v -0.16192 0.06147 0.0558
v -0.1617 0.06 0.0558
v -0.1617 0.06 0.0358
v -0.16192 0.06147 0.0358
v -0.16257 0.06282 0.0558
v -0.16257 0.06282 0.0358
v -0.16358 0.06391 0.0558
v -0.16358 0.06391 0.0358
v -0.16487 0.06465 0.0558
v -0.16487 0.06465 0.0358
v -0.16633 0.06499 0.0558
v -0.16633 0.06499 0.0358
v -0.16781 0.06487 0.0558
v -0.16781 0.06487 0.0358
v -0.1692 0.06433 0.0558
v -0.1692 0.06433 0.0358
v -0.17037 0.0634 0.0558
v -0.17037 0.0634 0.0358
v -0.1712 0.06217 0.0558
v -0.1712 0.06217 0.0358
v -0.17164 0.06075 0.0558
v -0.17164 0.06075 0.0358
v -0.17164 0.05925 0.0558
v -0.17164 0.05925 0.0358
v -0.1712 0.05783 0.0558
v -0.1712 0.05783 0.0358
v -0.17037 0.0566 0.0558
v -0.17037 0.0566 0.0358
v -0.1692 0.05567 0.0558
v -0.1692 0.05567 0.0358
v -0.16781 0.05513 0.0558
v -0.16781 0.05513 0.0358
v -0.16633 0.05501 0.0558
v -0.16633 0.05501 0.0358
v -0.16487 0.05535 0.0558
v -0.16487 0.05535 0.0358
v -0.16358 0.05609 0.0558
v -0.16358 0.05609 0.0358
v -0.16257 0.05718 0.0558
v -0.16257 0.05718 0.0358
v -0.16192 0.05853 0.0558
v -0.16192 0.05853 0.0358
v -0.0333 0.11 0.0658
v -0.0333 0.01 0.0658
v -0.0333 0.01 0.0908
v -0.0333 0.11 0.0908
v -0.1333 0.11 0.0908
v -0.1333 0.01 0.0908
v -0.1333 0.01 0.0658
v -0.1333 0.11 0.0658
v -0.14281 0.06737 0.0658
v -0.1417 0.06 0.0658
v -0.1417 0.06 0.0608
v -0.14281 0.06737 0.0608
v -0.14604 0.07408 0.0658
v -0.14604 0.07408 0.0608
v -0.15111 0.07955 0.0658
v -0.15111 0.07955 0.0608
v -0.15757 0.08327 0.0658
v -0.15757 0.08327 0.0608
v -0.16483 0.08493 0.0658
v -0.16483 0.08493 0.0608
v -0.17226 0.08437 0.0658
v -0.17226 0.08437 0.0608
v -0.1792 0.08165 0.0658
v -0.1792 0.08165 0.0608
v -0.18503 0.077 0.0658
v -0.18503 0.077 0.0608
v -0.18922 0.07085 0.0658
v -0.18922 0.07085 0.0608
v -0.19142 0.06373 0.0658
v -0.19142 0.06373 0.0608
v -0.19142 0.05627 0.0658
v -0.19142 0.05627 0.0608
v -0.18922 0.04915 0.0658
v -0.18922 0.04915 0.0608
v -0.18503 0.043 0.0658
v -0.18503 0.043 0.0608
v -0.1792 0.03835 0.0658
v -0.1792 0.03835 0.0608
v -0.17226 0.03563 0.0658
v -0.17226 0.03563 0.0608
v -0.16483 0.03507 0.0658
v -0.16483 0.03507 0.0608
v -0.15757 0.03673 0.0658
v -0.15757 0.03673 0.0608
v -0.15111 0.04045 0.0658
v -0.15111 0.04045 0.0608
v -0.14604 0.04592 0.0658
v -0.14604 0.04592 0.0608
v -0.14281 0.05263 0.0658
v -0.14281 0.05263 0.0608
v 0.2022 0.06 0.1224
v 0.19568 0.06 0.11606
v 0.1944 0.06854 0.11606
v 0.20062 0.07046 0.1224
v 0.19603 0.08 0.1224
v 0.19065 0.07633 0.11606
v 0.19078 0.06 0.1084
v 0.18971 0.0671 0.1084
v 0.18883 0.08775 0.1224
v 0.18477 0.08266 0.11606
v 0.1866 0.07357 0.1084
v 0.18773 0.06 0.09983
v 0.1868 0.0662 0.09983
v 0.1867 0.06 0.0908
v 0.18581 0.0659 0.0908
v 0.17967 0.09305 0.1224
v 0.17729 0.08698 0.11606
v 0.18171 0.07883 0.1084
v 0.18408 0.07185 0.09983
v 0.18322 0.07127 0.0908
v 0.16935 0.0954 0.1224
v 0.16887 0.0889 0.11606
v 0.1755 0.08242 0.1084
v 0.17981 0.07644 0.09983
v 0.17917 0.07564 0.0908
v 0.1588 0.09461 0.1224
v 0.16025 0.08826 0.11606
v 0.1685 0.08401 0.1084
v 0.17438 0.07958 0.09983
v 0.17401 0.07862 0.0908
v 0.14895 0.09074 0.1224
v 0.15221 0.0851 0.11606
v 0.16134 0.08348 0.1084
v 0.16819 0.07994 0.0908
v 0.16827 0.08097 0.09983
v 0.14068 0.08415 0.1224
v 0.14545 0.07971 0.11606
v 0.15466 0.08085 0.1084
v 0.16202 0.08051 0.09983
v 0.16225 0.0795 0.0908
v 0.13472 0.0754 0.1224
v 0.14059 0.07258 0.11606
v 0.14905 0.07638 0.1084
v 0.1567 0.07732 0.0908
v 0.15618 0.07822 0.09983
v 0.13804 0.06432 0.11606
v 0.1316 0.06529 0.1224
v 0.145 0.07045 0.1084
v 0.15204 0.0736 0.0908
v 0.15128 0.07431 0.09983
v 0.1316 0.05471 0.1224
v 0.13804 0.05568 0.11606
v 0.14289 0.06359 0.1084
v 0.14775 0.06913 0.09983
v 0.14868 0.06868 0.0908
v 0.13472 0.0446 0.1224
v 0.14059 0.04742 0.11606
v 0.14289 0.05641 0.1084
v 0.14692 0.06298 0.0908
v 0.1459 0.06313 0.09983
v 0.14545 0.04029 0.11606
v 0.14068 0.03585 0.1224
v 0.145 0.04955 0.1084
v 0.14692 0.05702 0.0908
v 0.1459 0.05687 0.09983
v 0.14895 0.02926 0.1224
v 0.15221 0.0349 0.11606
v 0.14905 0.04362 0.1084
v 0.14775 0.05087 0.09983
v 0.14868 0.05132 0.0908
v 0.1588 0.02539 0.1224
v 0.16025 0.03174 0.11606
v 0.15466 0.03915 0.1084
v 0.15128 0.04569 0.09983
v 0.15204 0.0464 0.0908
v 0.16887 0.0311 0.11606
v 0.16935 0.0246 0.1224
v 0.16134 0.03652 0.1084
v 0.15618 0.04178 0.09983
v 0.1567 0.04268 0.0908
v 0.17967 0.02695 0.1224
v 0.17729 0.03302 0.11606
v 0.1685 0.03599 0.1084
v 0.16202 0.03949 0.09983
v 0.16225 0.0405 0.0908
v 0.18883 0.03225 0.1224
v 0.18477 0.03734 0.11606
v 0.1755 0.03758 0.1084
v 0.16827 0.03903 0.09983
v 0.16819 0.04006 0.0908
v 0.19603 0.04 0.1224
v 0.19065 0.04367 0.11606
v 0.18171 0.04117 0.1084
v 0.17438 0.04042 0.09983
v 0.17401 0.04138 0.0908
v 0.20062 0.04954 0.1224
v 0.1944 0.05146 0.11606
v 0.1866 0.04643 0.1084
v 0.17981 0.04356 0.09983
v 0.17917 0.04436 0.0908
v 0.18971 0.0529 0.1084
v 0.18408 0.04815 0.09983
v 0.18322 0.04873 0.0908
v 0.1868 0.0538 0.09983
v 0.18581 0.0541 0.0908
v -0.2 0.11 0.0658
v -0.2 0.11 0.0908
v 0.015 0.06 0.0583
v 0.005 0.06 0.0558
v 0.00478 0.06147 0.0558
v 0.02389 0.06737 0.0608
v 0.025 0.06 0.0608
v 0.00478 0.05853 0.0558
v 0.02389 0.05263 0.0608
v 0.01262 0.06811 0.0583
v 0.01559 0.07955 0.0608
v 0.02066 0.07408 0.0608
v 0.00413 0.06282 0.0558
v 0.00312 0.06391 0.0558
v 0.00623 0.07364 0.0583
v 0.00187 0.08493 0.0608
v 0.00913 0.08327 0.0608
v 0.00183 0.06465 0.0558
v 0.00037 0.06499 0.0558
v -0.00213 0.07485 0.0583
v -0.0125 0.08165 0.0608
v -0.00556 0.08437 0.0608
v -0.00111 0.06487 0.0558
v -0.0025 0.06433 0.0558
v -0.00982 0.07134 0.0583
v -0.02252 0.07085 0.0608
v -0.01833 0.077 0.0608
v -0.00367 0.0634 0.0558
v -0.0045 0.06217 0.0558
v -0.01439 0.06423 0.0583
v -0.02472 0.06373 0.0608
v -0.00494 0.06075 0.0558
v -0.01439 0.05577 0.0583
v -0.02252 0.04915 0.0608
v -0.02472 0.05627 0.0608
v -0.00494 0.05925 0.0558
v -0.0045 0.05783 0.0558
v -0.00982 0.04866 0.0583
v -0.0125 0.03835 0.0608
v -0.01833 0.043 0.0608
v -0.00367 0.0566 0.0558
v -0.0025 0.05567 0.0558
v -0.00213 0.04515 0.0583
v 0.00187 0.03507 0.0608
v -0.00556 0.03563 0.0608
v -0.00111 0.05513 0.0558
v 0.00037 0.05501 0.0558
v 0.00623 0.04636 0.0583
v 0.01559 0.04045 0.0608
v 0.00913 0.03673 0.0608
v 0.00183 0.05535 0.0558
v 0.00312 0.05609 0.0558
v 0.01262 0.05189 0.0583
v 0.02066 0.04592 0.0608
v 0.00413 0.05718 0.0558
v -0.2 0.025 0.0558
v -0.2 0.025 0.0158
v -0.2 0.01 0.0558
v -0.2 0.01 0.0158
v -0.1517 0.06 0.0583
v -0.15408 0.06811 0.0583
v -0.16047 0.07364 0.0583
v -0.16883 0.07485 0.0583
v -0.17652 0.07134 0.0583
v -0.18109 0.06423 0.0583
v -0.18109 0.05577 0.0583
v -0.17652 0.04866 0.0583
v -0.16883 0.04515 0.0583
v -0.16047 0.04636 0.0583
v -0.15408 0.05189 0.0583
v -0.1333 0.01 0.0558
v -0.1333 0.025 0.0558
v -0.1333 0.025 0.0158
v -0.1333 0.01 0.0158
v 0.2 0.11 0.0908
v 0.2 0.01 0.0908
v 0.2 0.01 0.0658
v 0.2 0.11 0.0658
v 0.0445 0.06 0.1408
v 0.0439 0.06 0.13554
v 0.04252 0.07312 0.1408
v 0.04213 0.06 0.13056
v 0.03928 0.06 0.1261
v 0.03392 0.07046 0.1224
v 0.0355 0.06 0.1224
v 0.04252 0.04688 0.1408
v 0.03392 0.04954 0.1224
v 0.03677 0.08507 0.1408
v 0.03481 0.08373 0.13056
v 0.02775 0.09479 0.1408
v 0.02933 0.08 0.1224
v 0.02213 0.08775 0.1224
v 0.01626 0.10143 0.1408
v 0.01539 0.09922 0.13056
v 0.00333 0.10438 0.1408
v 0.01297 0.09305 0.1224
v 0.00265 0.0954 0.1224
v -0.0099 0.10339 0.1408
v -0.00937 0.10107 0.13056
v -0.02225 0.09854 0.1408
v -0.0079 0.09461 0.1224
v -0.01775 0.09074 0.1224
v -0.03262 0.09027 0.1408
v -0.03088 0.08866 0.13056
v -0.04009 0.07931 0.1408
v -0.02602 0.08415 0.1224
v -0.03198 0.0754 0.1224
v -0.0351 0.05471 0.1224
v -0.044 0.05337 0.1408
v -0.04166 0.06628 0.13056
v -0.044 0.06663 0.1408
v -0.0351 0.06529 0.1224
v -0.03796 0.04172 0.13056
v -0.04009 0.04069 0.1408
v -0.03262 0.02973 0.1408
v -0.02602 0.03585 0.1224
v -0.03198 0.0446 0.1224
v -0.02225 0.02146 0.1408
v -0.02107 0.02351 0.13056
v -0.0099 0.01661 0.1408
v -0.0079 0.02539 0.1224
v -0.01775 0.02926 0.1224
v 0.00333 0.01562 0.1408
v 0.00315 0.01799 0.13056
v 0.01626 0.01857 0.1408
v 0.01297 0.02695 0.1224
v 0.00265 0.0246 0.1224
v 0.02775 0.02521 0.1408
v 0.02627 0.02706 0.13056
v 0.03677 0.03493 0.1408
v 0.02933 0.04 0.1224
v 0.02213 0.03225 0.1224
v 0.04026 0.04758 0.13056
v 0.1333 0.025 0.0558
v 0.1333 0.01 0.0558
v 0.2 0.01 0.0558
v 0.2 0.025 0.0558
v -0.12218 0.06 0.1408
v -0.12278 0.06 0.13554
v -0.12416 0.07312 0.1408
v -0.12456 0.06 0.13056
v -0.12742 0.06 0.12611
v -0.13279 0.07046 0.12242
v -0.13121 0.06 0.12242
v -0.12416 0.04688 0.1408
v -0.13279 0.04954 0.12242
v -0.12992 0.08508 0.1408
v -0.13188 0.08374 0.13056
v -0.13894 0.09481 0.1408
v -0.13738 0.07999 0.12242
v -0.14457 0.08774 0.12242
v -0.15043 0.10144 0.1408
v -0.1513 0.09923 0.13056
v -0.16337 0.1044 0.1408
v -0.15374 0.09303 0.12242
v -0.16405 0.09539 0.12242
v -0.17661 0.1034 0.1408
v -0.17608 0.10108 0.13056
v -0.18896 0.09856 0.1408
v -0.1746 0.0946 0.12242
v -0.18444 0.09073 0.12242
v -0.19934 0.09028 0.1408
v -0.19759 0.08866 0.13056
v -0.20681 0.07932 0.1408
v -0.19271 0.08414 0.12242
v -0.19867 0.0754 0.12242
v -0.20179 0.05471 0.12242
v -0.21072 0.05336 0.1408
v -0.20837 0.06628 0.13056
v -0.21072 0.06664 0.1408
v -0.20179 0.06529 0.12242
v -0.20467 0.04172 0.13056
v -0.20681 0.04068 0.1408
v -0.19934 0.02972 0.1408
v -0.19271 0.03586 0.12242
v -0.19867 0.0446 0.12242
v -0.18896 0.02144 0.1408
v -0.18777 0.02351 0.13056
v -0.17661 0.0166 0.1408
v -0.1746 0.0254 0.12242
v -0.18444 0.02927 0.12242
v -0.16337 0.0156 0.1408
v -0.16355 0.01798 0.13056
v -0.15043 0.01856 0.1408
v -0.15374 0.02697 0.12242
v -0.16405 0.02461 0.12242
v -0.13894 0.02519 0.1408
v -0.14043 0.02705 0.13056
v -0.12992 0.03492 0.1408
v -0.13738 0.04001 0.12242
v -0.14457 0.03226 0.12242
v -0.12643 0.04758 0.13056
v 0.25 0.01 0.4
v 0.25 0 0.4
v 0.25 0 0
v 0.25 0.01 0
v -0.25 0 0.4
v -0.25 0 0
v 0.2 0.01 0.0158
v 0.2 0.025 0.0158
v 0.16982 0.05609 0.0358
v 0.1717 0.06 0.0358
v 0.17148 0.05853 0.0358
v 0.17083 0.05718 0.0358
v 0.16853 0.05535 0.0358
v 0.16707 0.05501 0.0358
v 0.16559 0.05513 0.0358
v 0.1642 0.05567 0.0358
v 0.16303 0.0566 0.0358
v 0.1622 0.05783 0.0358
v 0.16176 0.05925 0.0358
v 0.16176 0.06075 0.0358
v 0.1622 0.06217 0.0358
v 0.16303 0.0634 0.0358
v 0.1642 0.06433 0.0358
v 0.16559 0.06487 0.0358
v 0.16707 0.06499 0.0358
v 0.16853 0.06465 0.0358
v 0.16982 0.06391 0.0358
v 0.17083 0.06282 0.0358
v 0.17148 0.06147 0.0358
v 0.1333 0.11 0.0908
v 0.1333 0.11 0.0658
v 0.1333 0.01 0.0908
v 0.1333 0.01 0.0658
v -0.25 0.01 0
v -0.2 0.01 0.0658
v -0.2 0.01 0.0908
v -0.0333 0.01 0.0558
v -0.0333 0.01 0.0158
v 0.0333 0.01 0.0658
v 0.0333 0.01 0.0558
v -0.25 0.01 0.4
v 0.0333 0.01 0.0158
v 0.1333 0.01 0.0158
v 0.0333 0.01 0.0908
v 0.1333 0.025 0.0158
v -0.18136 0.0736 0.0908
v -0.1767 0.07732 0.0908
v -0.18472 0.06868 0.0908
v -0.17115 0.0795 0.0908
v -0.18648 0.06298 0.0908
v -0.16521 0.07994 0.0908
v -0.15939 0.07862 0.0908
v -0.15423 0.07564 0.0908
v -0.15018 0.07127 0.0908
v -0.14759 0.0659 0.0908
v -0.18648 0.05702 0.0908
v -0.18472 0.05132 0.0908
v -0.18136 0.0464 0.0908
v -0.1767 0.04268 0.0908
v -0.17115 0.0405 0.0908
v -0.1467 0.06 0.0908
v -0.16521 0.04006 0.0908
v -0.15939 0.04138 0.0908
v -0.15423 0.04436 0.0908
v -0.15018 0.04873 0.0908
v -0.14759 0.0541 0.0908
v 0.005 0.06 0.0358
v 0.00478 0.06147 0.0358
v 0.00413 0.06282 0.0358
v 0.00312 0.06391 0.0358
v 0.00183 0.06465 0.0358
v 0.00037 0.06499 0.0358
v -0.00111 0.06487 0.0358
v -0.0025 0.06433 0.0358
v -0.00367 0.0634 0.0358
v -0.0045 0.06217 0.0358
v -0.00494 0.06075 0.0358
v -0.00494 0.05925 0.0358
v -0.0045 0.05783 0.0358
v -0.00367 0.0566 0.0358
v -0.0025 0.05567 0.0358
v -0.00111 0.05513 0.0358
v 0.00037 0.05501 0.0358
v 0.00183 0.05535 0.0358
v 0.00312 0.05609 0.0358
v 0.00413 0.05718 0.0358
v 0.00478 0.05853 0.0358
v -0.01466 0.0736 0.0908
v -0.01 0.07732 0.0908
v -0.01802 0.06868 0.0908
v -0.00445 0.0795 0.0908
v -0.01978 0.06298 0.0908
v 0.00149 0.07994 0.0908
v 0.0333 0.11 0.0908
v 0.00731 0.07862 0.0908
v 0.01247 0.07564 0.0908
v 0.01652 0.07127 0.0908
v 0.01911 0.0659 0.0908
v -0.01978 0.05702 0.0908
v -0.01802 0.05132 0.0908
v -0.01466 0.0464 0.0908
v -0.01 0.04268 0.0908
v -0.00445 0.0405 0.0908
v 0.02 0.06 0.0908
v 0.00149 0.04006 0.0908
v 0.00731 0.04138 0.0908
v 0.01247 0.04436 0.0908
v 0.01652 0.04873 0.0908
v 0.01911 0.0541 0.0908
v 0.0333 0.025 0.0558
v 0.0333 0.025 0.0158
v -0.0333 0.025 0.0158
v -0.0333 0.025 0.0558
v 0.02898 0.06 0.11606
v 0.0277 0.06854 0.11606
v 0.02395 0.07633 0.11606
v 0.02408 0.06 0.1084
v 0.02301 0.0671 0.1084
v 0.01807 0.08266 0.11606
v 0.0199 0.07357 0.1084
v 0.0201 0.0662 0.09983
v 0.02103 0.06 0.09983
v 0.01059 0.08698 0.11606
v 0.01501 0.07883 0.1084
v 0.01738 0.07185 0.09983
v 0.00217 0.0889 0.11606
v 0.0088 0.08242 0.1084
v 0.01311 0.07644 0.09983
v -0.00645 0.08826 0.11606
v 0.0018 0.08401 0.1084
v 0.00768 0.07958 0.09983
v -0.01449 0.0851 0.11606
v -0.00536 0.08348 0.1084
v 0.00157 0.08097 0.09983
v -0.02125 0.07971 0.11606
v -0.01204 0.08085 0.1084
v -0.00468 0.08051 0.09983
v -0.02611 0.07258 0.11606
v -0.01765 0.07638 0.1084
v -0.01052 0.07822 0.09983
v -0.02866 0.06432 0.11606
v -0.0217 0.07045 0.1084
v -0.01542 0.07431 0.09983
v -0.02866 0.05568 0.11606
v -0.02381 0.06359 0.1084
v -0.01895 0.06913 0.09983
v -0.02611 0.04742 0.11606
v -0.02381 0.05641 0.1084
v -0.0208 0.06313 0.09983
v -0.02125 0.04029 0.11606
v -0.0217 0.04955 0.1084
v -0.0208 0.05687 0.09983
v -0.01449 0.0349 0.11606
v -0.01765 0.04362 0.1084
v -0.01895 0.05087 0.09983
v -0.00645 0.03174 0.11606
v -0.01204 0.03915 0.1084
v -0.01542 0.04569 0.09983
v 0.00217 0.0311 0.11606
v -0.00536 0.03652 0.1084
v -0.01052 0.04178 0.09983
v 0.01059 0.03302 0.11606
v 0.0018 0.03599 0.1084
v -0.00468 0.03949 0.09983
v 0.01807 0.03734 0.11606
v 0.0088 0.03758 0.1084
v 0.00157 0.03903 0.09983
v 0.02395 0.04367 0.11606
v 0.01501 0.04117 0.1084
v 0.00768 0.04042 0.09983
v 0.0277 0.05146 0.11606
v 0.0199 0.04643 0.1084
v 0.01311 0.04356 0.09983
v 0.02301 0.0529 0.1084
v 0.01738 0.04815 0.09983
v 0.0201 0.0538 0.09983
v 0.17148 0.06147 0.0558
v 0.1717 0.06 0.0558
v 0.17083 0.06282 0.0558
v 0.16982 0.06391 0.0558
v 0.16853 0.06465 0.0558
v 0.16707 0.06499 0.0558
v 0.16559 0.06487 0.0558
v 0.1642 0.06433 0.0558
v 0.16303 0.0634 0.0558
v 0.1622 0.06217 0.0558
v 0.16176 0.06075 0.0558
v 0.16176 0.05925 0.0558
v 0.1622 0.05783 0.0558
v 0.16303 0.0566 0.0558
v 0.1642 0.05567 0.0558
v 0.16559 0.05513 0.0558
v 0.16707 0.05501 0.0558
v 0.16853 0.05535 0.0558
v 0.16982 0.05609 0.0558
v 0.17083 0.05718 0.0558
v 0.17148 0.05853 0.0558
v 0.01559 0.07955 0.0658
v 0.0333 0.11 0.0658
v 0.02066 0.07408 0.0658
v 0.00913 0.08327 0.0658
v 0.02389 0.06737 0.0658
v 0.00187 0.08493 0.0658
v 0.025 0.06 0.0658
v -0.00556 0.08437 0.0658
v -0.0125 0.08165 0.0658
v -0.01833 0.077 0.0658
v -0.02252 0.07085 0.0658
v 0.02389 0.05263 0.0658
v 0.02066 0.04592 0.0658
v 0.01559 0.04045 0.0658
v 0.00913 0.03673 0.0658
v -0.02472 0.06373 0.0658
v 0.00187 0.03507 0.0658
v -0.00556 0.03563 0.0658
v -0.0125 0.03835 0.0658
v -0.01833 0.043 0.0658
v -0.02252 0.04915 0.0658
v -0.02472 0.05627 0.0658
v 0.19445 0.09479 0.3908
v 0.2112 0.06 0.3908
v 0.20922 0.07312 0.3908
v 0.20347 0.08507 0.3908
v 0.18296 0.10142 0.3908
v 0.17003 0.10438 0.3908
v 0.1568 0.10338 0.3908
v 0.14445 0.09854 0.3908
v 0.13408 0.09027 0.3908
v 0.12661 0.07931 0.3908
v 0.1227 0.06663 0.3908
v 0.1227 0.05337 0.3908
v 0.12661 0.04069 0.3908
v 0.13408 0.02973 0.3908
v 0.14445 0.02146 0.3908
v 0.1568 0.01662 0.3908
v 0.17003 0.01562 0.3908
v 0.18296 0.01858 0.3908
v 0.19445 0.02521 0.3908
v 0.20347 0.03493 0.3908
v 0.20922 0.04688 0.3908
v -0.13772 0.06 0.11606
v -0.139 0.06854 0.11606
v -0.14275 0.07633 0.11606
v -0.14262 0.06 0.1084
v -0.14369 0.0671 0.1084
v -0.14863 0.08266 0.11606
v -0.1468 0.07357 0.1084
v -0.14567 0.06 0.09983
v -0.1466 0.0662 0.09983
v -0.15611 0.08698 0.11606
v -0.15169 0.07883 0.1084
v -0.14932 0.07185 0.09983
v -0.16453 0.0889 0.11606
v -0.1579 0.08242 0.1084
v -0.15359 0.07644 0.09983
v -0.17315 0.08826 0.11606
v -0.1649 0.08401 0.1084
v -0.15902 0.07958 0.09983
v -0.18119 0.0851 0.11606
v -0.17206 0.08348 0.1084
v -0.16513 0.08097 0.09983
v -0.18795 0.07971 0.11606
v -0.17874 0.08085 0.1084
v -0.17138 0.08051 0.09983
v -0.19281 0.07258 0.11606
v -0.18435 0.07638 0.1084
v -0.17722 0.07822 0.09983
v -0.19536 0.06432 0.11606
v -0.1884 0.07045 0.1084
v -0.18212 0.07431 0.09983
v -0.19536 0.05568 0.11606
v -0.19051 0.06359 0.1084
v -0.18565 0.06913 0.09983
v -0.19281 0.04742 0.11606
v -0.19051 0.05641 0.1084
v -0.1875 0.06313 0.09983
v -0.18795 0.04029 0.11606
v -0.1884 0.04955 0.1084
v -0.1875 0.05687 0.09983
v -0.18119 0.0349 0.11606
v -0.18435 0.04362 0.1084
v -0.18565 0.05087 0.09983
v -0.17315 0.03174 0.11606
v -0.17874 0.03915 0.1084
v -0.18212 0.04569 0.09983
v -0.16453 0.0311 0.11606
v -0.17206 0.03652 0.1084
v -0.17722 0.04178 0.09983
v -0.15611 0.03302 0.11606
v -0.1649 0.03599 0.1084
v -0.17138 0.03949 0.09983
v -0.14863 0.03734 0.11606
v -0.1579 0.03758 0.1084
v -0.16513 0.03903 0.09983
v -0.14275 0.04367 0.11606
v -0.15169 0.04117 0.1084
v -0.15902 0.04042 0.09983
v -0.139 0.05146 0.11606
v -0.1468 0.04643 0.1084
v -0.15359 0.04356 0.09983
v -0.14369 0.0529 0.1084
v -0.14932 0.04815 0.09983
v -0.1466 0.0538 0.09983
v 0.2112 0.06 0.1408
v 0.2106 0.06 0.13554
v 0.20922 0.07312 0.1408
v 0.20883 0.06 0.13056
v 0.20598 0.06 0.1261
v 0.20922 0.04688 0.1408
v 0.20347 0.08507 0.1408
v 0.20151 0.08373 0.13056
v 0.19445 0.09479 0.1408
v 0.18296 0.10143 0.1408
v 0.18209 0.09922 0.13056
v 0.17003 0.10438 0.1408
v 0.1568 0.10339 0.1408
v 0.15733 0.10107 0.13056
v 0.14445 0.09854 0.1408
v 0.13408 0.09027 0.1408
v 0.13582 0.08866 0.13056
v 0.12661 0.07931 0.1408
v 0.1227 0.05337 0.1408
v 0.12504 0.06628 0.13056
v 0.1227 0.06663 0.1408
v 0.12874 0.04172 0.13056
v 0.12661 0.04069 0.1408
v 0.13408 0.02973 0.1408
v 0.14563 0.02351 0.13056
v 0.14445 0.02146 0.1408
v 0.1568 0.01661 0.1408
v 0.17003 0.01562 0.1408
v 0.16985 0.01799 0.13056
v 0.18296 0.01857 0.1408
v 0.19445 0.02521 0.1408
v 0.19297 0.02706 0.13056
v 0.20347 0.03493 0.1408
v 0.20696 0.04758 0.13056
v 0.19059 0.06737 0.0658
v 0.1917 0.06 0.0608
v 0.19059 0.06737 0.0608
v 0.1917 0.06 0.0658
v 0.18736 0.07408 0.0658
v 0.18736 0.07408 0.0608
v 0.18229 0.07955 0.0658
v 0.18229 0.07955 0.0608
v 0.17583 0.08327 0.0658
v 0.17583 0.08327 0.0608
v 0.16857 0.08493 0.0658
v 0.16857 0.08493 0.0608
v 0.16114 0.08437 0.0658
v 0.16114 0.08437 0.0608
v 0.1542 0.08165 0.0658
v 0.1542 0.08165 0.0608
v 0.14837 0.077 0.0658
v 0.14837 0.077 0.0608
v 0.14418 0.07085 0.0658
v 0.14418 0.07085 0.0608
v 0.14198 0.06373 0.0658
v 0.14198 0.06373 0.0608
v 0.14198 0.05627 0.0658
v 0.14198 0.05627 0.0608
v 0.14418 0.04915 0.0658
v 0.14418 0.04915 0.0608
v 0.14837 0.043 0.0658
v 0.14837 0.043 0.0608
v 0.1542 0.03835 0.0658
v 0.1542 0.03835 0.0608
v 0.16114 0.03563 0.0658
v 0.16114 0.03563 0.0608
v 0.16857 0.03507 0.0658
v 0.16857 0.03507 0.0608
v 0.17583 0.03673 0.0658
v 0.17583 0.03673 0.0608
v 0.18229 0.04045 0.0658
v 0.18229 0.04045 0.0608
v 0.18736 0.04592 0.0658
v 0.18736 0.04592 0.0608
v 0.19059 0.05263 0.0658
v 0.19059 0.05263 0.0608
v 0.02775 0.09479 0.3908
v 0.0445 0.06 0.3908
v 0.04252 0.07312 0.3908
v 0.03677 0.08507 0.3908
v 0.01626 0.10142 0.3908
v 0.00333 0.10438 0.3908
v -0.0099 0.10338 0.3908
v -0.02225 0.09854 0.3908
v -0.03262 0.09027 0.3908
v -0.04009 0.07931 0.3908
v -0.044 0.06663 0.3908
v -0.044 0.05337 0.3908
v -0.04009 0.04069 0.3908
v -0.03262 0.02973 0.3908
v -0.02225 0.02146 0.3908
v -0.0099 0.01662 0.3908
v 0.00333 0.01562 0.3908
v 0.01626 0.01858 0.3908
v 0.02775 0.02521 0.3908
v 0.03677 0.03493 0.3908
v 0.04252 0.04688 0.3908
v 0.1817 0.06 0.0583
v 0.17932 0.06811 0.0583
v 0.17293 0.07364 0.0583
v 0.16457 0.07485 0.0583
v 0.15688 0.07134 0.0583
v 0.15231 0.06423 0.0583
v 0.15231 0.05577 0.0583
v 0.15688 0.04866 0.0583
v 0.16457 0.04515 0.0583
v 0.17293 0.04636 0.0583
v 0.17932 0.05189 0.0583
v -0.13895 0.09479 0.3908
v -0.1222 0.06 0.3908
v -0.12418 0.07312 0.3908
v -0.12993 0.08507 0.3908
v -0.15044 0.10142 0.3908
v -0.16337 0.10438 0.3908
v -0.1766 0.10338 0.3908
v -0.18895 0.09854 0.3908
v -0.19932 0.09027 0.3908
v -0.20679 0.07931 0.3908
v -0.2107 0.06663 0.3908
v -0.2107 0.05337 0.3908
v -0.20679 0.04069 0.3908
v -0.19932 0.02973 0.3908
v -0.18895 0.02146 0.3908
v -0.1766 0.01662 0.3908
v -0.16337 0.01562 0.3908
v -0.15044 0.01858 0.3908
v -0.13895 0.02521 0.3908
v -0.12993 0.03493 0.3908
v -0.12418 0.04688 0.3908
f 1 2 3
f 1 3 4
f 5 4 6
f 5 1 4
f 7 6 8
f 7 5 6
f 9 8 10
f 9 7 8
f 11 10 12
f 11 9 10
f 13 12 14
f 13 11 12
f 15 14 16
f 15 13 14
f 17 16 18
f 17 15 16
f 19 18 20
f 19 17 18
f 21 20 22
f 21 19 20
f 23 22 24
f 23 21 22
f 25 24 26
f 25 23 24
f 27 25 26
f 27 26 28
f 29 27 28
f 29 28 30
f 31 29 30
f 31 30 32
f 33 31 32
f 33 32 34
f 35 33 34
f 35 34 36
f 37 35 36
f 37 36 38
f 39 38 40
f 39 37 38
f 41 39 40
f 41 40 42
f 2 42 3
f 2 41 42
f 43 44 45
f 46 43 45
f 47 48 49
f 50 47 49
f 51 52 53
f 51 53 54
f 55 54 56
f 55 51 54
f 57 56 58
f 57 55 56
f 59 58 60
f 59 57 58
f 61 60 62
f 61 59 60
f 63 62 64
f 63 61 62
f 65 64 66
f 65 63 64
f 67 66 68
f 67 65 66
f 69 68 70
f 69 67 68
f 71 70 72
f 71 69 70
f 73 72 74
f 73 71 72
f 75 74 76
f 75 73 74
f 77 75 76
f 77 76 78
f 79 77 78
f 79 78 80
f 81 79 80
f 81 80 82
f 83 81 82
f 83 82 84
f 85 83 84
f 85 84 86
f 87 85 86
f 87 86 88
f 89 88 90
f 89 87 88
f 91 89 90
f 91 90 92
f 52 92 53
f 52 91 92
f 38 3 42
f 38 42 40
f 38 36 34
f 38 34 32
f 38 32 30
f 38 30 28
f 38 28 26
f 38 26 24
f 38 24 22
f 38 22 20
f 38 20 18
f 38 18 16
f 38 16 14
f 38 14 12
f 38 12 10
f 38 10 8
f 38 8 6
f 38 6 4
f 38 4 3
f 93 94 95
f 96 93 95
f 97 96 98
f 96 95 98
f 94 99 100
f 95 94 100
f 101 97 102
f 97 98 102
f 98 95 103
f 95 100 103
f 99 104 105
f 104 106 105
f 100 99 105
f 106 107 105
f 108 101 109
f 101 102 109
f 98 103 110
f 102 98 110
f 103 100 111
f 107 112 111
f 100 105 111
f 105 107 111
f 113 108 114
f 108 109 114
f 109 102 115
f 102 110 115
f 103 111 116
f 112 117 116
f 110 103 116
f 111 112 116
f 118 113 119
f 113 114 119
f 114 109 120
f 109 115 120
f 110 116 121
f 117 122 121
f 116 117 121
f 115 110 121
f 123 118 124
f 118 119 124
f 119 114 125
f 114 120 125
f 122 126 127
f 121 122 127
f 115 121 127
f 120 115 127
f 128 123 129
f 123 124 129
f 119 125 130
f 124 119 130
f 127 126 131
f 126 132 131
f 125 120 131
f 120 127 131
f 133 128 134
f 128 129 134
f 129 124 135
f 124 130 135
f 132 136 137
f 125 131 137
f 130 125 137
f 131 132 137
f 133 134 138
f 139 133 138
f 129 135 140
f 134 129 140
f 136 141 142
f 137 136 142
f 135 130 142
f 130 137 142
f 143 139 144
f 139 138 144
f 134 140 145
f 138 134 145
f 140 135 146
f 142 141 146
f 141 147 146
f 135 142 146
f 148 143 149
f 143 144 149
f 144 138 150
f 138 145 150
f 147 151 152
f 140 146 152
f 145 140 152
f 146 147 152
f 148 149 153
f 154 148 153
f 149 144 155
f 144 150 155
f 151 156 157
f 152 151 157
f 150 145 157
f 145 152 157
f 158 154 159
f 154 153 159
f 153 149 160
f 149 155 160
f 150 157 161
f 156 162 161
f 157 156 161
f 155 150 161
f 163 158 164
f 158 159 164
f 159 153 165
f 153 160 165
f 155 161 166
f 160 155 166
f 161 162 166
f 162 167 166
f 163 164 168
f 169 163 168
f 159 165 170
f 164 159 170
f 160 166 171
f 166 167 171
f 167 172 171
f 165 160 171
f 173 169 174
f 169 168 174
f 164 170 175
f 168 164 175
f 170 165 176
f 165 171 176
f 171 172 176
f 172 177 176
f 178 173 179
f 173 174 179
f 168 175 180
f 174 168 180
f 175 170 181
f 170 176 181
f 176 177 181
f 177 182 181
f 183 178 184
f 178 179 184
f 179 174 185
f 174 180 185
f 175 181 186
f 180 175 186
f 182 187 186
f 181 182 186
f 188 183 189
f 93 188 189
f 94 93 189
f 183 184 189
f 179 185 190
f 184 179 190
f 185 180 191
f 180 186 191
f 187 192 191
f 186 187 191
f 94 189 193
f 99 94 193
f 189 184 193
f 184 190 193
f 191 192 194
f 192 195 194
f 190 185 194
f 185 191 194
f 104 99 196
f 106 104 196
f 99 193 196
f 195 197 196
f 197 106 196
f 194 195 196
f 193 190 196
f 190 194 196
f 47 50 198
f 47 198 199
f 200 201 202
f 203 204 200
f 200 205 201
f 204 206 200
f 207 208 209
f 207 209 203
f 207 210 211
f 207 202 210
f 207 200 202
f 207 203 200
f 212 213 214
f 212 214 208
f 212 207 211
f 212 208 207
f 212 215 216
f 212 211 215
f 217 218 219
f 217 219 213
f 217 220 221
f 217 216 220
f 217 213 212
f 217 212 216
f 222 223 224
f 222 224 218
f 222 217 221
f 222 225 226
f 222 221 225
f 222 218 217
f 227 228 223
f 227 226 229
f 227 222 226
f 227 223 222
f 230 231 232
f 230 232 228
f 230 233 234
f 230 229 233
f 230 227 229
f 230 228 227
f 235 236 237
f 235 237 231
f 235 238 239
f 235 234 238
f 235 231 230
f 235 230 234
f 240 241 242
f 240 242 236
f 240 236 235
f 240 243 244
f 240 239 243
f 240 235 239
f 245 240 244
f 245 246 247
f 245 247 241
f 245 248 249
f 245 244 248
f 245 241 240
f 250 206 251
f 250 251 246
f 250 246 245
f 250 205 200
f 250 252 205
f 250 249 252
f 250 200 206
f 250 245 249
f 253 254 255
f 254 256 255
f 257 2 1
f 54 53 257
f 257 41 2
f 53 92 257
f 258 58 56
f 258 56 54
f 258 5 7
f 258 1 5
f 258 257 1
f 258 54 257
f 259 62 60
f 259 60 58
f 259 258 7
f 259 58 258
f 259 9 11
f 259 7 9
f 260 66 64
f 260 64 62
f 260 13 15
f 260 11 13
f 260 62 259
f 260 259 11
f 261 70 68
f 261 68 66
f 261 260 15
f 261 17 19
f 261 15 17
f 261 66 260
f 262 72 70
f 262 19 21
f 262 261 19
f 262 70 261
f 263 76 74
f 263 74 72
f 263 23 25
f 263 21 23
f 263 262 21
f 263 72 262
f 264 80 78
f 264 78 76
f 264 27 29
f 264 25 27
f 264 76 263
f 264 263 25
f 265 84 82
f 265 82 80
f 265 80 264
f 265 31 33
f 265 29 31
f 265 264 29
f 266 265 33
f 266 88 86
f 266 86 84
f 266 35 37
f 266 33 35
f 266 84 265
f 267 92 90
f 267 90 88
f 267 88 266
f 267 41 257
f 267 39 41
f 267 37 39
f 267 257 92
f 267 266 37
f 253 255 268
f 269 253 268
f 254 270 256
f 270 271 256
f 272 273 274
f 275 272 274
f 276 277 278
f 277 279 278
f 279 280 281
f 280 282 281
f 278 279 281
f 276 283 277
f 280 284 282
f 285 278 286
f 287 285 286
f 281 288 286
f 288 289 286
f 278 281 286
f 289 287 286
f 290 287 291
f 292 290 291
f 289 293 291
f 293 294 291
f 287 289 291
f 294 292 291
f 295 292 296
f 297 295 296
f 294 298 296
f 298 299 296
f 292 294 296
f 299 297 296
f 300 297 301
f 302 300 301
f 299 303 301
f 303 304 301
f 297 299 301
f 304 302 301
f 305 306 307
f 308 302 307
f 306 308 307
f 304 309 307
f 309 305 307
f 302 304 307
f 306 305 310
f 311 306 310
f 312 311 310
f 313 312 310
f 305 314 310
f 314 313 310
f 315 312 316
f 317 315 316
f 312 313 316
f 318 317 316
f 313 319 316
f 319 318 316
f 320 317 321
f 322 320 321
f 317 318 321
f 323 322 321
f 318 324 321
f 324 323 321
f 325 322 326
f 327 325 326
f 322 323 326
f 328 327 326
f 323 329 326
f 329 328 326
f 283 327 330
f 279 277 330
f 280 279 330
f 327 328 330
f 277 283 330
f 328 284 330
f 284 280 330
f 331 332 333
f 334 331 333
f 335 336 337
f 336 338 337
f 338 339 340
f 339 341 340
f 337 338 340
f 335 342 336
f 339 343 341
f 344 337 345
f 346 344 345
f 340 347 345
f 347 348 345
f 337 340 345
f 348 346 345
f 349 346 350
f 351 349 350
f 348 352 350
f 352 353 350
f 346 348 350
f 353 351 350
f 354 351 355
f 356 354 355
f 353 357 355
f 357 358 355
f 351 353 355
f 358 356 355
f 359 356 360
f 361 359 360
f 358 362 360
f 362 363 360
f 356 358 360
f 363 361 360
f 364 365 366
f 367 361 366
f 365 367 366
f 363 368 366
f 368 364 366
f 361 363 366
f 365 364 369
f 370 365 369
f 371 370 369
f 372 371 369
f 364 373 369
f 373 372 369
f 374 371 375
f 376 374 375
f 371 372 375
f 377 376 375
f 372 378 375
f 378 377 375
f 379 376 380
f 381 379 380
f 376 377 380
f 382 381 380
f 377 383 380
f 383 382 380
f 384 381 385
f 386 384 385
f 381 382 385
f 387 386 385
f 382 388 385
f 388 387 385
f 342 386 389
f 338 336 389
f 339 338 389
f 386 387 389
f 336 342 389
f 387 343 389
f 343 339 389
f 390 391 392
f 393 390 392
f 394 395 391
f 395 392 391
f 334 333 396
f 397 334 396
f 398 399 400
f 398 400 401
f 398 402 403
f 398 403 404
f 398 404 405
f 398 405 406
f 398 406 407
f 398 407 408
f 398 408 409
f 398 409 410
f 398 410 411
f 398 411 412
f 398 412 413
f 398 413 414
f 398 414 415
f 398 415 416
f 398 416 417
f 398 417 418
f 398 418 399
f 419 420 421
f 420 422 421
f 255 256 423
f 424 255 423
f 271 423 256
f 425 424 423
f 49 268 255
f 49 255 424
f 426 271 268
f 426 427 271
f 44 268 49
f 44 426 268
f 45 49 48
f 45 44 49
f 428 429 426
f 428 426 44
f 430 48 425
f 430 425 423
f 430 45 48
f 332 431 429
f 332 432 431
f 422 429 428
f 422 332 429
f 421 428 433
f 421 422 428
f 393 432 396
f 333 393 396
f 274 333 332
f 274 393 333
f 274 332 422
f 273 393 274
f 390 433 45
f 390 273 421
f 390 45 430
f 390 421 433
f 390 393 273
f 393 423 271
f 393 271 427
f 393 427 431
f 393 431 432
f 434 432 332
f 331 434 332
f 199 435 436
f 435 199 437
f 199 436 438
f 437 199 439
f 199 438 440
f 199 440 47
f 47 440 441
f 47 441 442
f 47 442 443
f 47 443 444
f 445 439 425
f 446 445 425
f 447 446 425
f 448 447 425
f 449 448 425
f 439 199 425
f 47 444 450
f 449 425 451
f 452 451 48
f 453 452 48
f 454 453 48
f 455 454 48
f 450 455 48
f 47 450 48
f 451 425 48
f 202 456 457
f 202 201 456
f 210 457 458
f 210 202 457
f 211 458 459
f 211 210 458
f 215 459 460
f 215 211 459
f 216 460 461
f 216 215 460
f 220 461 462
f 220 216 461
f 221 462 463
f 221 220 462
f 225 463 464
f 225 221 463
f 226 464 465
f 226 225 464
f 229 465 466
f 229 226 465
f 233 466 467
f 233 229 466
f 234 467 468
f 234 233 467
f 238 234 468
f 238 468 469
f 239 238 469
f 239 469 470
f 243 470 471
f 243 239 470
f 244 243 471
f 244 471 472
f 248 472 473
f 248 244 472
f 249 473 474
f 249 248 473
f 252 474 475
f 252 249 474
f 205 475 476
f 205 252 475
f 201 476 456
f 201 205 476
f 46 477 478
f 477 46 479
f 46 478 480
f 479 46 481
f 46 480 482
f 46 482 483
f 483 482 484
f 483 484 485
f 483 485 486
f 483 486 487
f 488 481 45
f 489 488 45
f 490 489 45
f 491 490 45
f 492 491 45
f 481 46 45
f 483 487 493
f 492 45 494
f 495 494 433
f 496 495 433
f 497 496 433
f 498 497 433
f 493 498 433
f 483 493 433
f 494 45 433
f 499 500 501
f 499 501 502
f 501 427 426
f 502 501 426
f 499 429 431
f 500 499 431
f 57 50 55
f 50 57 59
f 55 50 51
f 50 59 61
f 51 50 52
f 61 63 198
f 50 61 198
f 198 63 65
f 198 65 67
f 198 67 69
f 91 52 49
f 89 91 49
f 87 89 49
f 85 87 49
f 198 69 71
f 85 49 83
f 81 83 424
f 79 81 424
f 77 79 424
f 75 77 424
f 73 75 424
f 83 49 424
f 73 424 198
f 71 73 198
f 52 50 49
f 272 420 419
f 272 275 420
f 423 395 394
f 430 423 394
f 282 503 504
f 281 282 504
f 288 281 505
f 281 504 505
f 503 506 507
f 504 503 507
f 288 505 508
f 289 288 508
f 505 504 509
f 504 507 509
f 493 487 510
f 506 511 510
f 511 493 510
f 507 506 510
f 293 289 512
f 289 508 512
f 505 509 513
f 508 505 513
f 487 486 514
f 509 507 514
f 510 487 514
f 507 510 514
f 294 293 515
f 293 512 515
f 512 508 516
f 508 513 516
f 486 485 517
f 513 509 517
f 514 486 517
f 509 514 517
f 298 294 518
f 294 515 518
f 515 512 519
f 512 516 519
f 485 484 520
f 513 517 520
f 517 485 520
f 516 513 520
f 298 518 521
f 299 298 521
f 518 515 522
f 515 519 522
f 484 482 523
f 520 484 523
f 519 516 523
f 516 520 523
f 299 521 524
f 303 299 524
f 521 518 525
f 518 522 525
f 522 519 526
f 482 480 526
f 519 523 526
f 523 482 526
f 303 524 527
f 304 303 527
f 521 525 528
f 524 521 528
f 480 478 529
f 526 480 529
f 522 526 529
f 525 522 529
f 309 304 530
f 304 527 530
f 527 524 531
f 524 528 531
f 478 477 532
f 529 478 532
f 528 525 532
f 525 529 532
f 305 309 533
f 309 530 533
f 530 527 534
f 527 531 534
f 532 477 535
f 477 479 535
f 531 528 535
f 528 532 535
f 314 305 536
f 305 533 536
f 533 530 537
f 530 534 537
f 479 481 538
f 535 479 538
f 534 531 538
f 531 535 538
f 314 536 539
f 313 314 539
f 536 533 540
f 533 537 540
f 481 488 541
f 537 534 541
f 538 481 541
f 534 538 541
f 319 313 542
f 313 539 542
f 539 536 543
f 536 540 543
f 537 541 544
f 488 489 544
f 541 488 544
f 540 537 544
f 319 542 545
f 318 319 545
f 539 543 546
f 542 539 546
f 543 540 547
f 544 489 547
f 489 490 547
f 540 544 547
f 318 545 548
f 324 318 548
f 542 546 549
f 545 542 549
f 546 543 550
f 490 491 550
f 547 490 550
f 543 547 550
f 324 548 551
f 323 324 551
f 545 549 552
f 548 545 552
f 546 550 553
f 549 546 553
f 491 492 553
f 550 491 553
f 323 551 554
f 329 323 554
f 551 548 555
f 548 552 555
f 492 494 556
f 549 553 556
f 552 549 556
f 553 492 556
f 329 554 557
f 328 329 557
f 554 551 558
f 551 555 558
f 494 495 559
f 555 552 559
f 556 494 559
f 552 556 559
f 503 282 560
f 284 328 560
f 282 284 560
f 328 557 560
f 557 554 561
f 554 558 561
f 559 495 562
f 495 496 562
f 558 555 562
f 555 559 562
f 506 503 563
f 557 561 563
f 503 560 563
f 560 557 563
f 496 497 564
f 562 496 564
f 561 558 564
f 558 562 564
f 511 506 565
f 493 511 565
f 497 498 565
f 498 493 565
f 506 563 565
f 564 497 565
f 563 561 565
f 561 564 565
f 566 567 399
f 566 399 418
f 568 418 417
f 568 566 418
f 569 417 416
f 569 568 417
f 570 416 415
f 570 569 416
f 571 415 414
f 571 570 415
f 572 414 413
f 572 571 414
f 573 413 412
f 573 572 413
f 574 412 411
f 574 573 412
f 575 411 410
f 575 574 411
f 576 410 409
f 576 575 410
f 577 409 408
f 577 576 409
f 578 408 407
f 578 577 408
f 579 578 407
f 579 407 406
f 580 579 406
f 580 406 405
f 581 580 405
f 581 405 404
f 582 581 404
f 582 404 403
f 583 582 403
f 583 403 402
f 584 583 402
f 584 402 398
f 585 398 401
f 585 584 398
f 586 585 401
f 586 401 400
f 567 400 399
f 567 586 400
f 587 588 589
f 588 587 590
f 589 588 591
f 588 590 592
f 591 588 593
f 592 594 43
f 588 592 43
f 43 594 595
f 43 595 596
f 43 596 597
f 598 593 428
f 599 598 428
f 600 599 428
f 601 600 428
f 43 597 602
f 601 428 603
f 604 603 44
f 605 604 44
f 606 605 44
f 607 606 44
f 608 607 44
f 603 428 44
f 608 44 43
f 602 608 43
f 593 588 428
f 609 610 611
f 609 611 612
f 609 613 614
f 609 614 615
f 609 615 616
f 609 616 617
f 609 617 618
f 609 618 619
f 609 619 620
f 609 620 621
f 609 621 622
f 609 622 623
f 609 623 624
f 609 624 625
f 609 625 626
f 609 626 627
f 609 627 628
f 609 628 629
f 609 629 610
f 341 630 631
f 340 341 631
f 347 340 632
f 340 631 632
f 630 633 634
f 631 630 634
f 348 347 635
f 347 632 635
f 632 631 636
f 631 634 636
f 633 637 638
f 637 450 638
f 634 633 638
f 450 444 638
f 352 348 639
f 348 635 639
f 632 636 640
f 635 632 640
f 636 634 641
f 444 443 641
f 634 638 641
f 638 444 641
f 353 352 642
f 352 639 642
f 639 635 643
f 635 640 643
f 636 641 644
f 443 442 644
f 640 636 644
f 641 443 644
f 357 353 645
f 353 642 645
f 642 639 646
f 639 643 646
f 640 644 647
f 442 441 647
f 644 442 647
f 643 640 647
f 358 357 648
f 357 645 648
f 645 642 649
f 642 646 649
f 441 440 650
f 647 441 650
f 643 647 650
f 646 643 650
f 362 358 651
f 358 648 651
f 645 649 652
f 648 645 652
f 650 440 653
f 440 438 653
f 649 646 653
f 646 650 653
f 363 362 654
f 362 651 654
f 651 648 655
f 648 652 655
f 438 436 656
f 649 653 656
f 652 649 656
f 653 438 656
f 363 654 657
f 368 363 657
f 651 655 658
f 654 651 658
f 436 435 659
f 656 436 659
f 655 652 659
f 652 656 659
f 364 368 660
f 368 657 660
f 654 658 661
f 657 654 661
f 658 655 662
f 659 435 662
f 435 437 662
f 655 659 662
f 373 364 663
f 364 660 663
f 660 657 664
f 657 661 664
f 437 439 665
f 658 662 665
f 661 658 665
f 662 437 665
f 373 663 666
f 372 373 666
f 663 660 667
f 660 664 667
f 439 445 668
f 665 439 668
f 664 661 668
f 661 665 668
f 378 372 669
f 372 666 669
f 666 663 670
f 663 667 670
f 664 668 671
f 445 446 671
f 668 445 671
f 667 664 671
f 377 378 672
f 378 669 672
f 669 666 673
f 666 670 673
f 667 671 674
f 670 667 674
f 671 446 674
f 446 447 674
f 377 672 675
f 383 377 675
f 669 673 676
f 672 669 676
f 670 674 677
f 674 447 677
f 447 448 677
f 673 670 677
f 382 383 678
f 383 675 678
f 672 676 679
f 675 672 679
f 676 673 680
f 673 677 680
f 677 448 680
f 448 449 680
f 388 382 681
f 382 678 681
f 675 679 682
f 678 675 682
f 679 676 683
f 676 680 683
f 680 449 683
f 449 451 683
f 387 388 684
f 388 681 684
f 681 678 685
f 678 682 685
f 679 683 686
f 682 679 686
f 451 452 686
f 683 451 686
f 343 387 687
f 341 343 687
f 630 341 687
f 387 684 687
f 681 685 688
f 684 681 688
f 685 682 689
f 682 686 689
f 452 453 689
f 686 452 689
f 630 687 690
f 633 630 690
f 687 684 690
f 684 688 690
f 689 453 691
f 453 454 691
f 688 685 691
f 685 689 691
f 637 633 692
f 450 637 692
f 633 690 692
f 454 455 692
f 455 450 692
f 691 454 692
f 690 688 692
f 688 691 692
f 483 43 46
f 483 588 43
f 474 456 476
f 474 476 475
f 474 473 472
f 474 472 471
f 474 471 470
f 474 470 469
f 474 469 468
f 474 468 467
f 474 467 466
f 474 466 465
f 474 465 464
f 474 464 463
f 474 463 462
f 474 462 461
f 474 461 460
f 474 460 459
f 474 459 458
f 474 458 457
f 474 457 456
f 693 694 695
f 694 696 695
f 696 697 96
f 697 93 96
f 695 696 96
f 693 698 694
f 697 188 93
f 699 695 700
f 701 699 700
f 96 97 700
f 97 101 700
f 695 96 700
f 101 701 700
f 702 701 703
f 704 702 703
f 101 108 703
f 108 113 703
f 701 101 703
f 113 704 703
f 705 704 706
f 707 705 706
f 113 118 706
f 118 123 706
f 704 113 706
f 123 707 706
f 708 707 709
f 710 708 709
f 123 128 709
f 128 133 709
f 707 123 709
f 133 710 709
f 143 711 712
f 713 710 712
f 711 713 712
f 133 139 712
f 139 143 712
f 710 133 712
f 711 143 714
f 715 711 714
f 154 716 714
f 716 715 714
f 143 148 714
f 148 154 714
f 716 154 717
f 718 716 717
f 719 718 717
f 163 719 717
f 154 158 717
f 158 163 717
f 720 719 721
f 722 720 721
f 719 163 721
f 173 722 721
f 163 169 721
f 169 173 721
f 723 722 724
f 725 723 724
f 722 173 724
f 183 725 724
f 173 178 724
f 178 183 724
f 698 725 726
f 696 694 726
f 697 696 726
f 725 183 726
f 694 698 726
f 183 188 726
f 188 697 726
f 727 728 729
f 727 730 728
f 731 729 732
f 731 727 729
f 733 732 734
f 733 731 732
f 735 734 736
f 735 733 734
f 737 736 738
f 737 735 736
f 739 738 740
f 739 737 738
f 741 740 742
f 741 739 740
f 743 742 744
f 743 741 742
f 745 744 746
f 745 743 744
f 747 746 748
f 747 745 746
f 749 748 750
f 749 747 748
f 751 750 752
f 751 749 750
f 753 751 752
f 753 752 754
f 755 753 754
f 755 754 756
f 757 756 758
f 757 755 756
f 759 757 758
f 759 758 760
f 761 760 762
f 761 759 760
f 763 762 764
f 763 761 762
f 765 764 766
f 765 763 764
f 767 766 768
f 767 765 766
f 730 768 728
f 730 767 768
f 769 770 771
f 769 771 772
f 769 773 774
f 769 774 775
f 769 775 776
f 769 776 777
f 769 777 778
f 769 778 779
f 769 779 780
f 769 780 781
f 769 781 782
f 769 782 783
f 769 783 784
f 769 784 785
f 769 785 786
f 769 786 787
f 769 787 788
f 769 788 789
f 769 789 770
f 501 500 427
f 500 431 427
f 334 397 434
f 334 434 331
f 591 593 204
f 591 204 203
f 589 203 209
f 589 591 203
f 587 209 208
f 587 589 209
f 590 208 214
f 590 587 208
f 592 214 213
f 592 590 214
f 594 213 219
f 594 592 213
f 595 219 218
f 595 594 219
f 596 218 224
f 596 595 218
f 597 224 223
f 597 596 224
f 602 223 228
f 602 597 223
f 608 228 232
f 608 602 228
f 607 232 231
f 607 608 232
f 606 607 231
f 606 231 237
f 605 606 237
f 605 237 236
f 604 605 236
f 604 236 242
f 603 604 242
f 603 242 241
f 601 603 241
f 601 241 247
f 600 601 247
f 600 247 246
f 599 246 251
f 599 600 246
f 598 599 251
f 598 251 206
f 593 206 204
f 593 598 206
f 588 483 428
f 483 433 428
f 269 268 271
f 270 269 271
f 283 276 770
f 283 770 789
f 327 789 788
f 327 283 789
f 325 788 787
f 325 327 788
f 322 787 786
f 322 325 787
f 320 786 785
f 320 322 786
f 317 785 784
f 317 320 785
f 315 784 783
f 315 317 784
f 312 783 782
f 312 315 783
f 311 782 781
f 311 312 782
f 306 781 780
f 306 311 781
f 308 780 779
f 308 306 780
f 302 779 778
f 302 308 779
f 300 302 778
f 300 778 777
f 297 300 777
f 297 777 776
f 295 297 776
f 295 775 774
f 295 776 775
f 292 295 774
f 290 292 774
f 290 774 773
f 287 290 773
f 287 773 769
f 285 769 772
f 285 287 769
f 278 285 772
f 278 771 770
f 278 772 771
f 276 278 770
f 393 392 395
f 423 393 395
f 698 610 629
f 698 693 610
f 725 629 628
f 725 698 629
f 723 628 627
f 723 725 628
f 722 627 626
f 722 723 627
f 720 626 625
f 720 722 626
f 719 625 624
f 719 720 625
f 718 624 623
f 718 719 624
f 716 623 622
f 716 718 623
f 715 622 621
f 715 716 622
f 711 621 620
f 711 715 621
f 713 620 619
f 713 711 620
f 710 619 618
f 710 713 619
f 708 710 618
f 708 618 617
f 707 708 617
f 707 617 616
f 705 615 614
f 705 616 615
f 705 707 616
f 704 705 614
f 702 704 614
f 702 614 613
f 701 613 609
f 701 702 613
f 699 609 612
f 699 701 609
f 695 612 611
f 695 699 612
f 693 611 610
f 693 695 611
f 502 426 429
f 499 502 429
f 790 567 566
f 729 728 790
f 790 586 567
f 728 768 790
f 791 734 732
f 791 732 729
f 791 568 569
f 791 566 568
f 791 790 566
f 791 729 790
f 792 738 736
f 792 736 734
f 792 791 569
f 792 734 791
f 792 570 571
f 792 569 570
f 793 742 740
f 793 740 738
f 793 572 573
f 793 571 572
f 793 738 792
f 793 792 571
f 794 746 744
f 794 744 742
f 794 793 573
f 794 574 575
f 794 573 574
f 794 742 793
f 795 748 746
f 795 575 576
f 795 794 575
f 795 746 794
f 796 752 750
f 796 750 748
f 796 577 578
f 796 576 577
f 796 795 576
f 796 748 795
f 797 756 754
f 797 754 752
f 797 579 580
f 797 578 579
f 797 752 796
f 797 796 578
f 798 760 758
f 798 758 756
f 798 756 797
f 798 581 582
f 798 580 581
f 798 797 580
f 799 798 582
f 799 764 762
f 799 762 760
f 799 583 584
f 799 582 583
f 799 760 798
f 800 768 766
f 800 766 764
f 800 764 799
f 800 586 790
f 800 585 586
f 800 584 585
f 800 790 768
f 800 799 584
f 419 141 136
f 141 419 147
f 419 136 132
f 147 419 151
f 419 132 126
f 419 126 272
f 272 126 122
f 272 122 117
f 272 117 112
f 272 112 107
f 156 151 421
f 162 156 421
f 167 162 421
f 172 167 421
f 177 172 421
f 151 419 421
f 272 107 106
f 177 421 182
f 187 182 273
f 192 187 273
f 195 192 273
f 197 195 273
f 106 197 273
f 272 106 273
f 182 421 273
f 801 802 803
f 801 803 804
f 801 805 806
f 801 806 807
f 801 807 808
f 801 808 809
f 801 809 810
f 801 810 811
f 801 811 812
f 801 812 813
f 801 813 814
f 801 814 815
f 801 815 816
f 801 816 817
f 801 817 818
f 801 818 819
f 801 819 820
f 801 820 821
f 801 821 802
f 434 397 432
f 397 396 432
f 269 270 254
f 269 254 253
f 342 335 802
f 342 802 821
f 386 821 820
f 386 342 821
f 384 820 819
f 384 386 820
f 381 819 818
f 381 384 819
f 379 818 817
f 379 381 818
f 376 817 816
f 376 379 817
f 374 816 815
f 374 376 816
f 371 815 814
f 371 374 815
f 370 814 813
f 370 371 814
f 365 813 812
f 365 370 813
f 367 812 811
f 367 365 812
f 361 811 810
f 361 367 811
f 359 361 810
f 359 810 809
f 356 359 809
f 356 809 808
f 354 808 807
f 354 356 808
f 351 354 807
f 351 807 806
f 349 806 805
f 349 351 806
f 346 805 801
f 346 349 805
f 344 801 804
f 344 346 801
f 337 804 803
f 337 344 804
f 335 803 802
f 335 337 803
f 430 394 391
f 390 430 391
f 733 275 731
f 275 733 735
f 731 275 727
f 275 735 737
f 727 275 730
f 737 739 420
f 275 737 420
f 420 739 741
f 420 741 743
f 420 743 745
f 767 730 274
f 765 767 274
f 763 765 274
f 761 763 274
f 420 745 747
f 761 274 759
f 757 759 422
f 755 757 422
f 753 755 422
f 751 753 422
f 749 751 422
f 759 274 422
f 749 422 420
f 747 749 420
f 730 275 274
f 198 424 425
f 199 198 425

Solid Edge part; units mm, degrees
sketch "Sketch1" plane through (0, 0, 0) normal (0, -1, 0) x (1, 0, 0)
  line L0 (0.25, 0.4) -> (0.25, 0)
  line L1 (0.25, 0) -> (-0.25, 0)
  line L2 (-0.25, 0) -> (-0.25, 0.4)
  line L3 (-0.25, 0.4) -> (0.25, 0.4)
extrude "Protrusion1" add sketch "Sketch1" against normal blind 0.01
sketch "Sketch2" plane through (0, 0.01, 0.2) normal (0, 1, 0) x (-1, 0, 0)
  line L0 (-0.2, -0.1342) -> (-0.1333, -0.1342)
  line L1 (-0.1333, -0.1342) -> (-0.1333, -0.1092)
  line L2 (-0.1333, -0.1092) -> (-0.2, -0.1092)
  line L3 (-0.2, -0.1092) -> (-0.2, -0.1342)
  line L4 (-0.0333, -0.1092) -> (-0.0333, -0.1342)
  line L5 (-0.0333, -0.1342) -> (0.0333, -0.1342)
  line L6 (0.0333, -0.1342) -> (0.0333, -0.1092)
  line L7 (0.0333, -0.1092) -> (-0.0333, -0.1092)
  line L8 (0.1333, -0.1342) -> (0.2, -0.1342)
  line L9 (0.2, -0.1342) -> (0.2, -0.1092)
  line L10 (0.2, -0.1092) -> (0.1333, -0.1092)
  line L11 (0.1333, -0.1092) -> (0.1333, -0.1342)
  dimension "D1" = 0.1
  dimension "D2" = 0.025
  dimension "D3" = 0.05
  dimension "D4" = 0.05
  dimension "D5" = 0.04
  dimension "D6" = 0.01
extrude "ExtrudedProtrusion_2" add sketch "Sketch2" along normal blind 0.1
sketch "Sketch3" plane through (0, 0.01, 0.2) normal (0, 1, 0) x (-1, 0, 0)
  line L0 (-0.2, -0.1842) -> (-0.1333, -0.1842)
  line L1 (-0.1333, -0.1842) -> (-0.1333, -0.1442)
  line L2 (-0.1333, -0.1442) -> (-0.2, -0.1442)
  line L3 (-0.2, -0.1442) -> (-0.2, -0.1842)
  line L4 (-0.0333, -0.1442) -> (-0.0333, -0.1842)
  line L5 (-0.0333, -0.1842) -> (0.0333, -0.1842)
  line L6 (0.0333, -0.1842) -> (0.0333, -0.1442)
  line L7 (0.0333, -0.1442) -> (-0.0333, -0.1442)
  line L8 (0.1333, -0.1842) -> (0.2, -0.1842)
  line L9 (0.2, -0.1842) -> (0.2, -0.1442)
  line L10 (0.2, -0.1442) -> (0.1333, -0.1442)
  line L11 (0.1333, -0.1442) -> (0.1333, -0.1842)
  dimension "D1" = 0.1
  dimension "D2" = 0.025
  dimension "D3" = 0.05
  dimension "D4" = 0.05
  dimension "D5" = 0.04
  dimension "D6" = 0.01
extrude "ExtrudedProtrusion_3" add sketch "Sketch3" along normal blind 0.015
sketch "Sketch4" plane through (0, 0.06, 0.2) normal (0, 1, 0) x (-1, 0, 0)
  line L0 (-0.2112, 0.1908) -> (-0.2112, -0.0592)
  arc A0 (-0.2112, -0.0592) -> (-0.2022, -0.0776) centre (-0.1879, -0.0592) ccw
  arc A1 (-0.2022, -0.0776) -> (-0.1867, -0.1092) centre (-0.2267, -0.1092) cw
  line L1 (-0.1867, -0.1092) -> (-0.1667, -0.1092)
  line L2 (-0.1667, -0.1092) -> (-0.1667, 0.1908)
  line L3 (-0.1667, 0.1908) -> (-0.2112, 0.1908)
revolve "RevolvedProtrusion1" add sketch "Sketch4" angle 360 about axis through (0.1667, 0.06, 0.0908) along (0, 0, 1)
sketch "Sketch5" plane through (0, 0.06, 0.2) normal (0, 1, 0) x (-1, 0, 0)
  line L0 (-0.0445, 0.1908) -> (-0.0445, -0.0592)
  arc A0 (-0.0445, -0.0592) -> (-0.0355, -0.0776) centre (-0.0212, -0.0592) ccw
  arc A1 (-0.0355, -0.0776) -> (-0.02, -0.1092) centre (-0.06, -0.1092) cw
  line L1 (-0.02, -0.1092) -> (0, -0.1092)
  line L2 (0, -0.1092) -> (0, 0.1908)
  line L3 (0, 0.1908) -> (-0.0445, 0.1908)
revolve "RevolvedProtrusion2" add sketch "Sketch5" angle 360 about axis through (0, 0.06, 0.0908) along (0, 0, 1)
sketch "Sketch6" plane through (0, 0.06, 0.2) normal (0, 1, 0) x (-1, 0, 0)
  line L0 (0.1222, 0.1908) -> (0.1222, -0.0592)
  arc A0 (0.1222, -0.0592) -> (0.1312, -0.0776) centre (0.1454, -0.0592) ccw
  arc A1 (0.1312, -0.0776) -> (0.1467, -0.1092) centre (0.1067, -0.1092) cw
  line L1 (0.1467, -0.1092) -> (0.1667, -0.1092)
  line L2 (0.1667, -0.1092) -> (0.1667, 0.1908)
  line L3 (0.1667, 0.1908) -> (0.1222, 0.1908)
revolve "RevolvedProtrusion3" add sketch "Sketch6" angle 360 about axis through (-0.1667, 0.06, 0.0908) along (0, 0, 1)
sketch "Sketch7" plane through (0, 0.06, 0.2) normal (0, 1, 0) x (-1, 0, 0)
  line L0 (-0.1717, -0.1442) -> (-0.1917, -0.1392)
  line L1 (-0.1917, -0.1392) -> (-0.1917, -0.1342)
  line L2 (-0.1917, -0.1342) -> (-0.1667, -0.1342)
  line L3 (-0.1667, -0.1342) -> (-0.1667, -0.1642)
  line L4 (-0.1667, -0.1642) -> (-0.1717, -0.1642)
  line L5 (-0.1717, -0.1642) -> (-0.1717, -0.1442)
revolve "RevolvedProtrusion4" add sketch "Sketch7" angle 360 about axis through (0.1667, 0.06, 0.0658) along (0, 0, -1)
sketch "Sketch8" plane through (0, 0.06, 0.2) normal (0, 1, 0) x (-1, 0, 0)
  line L0 (-0.005, -0.1442) -> (-0.025, -0.1392)
  line L1 (-0.025, -0.1392) -> (-0.025, -0.1342)
  line L2 (-0.025, -0.1342) -> (0, -0.1342)
  line L3 (0, -0.1342) -> (0, -0.1642)
  line L4 (0, -0.1642) -> (-0.005, -0.1642)
  line L5 (-0.005, -0.1642) -> (-0.005, -0.1442)
revolve "RevolvedProtrusion5" add sketch "Sketch8" angle 360 about axis through (0, 0.06, 0.0658) along (0, 0, -1)
sketch "Sketch9" plane through (0, 0.06, 0.2) normal (0, 1, 0) x (-1, 0, 0)
  line L0 (0.1617, -0.1642) -> (0.1617, -0.1442)
  line L1 (0.1617, -0.1442) -> (0.1417, -0.1392)
  line L2 (0.1417, -0.1392) -> (0.1417, -0.1342)
  line L3 (0.1417, -0.1342) -> (0.1667, -0.1342)
  line L4 (0.1667, -0.1342) -> (0.1667, -0.1642)
  line L5 (0.1667, -0.1642) -> (0.1617, -0.1642)
revolve "RevolvedProtrusion6" add sketch "Sketch9" angle 360 about axis through (-0.1667, 0.06, 0.0658) along (0, 0, -1)
